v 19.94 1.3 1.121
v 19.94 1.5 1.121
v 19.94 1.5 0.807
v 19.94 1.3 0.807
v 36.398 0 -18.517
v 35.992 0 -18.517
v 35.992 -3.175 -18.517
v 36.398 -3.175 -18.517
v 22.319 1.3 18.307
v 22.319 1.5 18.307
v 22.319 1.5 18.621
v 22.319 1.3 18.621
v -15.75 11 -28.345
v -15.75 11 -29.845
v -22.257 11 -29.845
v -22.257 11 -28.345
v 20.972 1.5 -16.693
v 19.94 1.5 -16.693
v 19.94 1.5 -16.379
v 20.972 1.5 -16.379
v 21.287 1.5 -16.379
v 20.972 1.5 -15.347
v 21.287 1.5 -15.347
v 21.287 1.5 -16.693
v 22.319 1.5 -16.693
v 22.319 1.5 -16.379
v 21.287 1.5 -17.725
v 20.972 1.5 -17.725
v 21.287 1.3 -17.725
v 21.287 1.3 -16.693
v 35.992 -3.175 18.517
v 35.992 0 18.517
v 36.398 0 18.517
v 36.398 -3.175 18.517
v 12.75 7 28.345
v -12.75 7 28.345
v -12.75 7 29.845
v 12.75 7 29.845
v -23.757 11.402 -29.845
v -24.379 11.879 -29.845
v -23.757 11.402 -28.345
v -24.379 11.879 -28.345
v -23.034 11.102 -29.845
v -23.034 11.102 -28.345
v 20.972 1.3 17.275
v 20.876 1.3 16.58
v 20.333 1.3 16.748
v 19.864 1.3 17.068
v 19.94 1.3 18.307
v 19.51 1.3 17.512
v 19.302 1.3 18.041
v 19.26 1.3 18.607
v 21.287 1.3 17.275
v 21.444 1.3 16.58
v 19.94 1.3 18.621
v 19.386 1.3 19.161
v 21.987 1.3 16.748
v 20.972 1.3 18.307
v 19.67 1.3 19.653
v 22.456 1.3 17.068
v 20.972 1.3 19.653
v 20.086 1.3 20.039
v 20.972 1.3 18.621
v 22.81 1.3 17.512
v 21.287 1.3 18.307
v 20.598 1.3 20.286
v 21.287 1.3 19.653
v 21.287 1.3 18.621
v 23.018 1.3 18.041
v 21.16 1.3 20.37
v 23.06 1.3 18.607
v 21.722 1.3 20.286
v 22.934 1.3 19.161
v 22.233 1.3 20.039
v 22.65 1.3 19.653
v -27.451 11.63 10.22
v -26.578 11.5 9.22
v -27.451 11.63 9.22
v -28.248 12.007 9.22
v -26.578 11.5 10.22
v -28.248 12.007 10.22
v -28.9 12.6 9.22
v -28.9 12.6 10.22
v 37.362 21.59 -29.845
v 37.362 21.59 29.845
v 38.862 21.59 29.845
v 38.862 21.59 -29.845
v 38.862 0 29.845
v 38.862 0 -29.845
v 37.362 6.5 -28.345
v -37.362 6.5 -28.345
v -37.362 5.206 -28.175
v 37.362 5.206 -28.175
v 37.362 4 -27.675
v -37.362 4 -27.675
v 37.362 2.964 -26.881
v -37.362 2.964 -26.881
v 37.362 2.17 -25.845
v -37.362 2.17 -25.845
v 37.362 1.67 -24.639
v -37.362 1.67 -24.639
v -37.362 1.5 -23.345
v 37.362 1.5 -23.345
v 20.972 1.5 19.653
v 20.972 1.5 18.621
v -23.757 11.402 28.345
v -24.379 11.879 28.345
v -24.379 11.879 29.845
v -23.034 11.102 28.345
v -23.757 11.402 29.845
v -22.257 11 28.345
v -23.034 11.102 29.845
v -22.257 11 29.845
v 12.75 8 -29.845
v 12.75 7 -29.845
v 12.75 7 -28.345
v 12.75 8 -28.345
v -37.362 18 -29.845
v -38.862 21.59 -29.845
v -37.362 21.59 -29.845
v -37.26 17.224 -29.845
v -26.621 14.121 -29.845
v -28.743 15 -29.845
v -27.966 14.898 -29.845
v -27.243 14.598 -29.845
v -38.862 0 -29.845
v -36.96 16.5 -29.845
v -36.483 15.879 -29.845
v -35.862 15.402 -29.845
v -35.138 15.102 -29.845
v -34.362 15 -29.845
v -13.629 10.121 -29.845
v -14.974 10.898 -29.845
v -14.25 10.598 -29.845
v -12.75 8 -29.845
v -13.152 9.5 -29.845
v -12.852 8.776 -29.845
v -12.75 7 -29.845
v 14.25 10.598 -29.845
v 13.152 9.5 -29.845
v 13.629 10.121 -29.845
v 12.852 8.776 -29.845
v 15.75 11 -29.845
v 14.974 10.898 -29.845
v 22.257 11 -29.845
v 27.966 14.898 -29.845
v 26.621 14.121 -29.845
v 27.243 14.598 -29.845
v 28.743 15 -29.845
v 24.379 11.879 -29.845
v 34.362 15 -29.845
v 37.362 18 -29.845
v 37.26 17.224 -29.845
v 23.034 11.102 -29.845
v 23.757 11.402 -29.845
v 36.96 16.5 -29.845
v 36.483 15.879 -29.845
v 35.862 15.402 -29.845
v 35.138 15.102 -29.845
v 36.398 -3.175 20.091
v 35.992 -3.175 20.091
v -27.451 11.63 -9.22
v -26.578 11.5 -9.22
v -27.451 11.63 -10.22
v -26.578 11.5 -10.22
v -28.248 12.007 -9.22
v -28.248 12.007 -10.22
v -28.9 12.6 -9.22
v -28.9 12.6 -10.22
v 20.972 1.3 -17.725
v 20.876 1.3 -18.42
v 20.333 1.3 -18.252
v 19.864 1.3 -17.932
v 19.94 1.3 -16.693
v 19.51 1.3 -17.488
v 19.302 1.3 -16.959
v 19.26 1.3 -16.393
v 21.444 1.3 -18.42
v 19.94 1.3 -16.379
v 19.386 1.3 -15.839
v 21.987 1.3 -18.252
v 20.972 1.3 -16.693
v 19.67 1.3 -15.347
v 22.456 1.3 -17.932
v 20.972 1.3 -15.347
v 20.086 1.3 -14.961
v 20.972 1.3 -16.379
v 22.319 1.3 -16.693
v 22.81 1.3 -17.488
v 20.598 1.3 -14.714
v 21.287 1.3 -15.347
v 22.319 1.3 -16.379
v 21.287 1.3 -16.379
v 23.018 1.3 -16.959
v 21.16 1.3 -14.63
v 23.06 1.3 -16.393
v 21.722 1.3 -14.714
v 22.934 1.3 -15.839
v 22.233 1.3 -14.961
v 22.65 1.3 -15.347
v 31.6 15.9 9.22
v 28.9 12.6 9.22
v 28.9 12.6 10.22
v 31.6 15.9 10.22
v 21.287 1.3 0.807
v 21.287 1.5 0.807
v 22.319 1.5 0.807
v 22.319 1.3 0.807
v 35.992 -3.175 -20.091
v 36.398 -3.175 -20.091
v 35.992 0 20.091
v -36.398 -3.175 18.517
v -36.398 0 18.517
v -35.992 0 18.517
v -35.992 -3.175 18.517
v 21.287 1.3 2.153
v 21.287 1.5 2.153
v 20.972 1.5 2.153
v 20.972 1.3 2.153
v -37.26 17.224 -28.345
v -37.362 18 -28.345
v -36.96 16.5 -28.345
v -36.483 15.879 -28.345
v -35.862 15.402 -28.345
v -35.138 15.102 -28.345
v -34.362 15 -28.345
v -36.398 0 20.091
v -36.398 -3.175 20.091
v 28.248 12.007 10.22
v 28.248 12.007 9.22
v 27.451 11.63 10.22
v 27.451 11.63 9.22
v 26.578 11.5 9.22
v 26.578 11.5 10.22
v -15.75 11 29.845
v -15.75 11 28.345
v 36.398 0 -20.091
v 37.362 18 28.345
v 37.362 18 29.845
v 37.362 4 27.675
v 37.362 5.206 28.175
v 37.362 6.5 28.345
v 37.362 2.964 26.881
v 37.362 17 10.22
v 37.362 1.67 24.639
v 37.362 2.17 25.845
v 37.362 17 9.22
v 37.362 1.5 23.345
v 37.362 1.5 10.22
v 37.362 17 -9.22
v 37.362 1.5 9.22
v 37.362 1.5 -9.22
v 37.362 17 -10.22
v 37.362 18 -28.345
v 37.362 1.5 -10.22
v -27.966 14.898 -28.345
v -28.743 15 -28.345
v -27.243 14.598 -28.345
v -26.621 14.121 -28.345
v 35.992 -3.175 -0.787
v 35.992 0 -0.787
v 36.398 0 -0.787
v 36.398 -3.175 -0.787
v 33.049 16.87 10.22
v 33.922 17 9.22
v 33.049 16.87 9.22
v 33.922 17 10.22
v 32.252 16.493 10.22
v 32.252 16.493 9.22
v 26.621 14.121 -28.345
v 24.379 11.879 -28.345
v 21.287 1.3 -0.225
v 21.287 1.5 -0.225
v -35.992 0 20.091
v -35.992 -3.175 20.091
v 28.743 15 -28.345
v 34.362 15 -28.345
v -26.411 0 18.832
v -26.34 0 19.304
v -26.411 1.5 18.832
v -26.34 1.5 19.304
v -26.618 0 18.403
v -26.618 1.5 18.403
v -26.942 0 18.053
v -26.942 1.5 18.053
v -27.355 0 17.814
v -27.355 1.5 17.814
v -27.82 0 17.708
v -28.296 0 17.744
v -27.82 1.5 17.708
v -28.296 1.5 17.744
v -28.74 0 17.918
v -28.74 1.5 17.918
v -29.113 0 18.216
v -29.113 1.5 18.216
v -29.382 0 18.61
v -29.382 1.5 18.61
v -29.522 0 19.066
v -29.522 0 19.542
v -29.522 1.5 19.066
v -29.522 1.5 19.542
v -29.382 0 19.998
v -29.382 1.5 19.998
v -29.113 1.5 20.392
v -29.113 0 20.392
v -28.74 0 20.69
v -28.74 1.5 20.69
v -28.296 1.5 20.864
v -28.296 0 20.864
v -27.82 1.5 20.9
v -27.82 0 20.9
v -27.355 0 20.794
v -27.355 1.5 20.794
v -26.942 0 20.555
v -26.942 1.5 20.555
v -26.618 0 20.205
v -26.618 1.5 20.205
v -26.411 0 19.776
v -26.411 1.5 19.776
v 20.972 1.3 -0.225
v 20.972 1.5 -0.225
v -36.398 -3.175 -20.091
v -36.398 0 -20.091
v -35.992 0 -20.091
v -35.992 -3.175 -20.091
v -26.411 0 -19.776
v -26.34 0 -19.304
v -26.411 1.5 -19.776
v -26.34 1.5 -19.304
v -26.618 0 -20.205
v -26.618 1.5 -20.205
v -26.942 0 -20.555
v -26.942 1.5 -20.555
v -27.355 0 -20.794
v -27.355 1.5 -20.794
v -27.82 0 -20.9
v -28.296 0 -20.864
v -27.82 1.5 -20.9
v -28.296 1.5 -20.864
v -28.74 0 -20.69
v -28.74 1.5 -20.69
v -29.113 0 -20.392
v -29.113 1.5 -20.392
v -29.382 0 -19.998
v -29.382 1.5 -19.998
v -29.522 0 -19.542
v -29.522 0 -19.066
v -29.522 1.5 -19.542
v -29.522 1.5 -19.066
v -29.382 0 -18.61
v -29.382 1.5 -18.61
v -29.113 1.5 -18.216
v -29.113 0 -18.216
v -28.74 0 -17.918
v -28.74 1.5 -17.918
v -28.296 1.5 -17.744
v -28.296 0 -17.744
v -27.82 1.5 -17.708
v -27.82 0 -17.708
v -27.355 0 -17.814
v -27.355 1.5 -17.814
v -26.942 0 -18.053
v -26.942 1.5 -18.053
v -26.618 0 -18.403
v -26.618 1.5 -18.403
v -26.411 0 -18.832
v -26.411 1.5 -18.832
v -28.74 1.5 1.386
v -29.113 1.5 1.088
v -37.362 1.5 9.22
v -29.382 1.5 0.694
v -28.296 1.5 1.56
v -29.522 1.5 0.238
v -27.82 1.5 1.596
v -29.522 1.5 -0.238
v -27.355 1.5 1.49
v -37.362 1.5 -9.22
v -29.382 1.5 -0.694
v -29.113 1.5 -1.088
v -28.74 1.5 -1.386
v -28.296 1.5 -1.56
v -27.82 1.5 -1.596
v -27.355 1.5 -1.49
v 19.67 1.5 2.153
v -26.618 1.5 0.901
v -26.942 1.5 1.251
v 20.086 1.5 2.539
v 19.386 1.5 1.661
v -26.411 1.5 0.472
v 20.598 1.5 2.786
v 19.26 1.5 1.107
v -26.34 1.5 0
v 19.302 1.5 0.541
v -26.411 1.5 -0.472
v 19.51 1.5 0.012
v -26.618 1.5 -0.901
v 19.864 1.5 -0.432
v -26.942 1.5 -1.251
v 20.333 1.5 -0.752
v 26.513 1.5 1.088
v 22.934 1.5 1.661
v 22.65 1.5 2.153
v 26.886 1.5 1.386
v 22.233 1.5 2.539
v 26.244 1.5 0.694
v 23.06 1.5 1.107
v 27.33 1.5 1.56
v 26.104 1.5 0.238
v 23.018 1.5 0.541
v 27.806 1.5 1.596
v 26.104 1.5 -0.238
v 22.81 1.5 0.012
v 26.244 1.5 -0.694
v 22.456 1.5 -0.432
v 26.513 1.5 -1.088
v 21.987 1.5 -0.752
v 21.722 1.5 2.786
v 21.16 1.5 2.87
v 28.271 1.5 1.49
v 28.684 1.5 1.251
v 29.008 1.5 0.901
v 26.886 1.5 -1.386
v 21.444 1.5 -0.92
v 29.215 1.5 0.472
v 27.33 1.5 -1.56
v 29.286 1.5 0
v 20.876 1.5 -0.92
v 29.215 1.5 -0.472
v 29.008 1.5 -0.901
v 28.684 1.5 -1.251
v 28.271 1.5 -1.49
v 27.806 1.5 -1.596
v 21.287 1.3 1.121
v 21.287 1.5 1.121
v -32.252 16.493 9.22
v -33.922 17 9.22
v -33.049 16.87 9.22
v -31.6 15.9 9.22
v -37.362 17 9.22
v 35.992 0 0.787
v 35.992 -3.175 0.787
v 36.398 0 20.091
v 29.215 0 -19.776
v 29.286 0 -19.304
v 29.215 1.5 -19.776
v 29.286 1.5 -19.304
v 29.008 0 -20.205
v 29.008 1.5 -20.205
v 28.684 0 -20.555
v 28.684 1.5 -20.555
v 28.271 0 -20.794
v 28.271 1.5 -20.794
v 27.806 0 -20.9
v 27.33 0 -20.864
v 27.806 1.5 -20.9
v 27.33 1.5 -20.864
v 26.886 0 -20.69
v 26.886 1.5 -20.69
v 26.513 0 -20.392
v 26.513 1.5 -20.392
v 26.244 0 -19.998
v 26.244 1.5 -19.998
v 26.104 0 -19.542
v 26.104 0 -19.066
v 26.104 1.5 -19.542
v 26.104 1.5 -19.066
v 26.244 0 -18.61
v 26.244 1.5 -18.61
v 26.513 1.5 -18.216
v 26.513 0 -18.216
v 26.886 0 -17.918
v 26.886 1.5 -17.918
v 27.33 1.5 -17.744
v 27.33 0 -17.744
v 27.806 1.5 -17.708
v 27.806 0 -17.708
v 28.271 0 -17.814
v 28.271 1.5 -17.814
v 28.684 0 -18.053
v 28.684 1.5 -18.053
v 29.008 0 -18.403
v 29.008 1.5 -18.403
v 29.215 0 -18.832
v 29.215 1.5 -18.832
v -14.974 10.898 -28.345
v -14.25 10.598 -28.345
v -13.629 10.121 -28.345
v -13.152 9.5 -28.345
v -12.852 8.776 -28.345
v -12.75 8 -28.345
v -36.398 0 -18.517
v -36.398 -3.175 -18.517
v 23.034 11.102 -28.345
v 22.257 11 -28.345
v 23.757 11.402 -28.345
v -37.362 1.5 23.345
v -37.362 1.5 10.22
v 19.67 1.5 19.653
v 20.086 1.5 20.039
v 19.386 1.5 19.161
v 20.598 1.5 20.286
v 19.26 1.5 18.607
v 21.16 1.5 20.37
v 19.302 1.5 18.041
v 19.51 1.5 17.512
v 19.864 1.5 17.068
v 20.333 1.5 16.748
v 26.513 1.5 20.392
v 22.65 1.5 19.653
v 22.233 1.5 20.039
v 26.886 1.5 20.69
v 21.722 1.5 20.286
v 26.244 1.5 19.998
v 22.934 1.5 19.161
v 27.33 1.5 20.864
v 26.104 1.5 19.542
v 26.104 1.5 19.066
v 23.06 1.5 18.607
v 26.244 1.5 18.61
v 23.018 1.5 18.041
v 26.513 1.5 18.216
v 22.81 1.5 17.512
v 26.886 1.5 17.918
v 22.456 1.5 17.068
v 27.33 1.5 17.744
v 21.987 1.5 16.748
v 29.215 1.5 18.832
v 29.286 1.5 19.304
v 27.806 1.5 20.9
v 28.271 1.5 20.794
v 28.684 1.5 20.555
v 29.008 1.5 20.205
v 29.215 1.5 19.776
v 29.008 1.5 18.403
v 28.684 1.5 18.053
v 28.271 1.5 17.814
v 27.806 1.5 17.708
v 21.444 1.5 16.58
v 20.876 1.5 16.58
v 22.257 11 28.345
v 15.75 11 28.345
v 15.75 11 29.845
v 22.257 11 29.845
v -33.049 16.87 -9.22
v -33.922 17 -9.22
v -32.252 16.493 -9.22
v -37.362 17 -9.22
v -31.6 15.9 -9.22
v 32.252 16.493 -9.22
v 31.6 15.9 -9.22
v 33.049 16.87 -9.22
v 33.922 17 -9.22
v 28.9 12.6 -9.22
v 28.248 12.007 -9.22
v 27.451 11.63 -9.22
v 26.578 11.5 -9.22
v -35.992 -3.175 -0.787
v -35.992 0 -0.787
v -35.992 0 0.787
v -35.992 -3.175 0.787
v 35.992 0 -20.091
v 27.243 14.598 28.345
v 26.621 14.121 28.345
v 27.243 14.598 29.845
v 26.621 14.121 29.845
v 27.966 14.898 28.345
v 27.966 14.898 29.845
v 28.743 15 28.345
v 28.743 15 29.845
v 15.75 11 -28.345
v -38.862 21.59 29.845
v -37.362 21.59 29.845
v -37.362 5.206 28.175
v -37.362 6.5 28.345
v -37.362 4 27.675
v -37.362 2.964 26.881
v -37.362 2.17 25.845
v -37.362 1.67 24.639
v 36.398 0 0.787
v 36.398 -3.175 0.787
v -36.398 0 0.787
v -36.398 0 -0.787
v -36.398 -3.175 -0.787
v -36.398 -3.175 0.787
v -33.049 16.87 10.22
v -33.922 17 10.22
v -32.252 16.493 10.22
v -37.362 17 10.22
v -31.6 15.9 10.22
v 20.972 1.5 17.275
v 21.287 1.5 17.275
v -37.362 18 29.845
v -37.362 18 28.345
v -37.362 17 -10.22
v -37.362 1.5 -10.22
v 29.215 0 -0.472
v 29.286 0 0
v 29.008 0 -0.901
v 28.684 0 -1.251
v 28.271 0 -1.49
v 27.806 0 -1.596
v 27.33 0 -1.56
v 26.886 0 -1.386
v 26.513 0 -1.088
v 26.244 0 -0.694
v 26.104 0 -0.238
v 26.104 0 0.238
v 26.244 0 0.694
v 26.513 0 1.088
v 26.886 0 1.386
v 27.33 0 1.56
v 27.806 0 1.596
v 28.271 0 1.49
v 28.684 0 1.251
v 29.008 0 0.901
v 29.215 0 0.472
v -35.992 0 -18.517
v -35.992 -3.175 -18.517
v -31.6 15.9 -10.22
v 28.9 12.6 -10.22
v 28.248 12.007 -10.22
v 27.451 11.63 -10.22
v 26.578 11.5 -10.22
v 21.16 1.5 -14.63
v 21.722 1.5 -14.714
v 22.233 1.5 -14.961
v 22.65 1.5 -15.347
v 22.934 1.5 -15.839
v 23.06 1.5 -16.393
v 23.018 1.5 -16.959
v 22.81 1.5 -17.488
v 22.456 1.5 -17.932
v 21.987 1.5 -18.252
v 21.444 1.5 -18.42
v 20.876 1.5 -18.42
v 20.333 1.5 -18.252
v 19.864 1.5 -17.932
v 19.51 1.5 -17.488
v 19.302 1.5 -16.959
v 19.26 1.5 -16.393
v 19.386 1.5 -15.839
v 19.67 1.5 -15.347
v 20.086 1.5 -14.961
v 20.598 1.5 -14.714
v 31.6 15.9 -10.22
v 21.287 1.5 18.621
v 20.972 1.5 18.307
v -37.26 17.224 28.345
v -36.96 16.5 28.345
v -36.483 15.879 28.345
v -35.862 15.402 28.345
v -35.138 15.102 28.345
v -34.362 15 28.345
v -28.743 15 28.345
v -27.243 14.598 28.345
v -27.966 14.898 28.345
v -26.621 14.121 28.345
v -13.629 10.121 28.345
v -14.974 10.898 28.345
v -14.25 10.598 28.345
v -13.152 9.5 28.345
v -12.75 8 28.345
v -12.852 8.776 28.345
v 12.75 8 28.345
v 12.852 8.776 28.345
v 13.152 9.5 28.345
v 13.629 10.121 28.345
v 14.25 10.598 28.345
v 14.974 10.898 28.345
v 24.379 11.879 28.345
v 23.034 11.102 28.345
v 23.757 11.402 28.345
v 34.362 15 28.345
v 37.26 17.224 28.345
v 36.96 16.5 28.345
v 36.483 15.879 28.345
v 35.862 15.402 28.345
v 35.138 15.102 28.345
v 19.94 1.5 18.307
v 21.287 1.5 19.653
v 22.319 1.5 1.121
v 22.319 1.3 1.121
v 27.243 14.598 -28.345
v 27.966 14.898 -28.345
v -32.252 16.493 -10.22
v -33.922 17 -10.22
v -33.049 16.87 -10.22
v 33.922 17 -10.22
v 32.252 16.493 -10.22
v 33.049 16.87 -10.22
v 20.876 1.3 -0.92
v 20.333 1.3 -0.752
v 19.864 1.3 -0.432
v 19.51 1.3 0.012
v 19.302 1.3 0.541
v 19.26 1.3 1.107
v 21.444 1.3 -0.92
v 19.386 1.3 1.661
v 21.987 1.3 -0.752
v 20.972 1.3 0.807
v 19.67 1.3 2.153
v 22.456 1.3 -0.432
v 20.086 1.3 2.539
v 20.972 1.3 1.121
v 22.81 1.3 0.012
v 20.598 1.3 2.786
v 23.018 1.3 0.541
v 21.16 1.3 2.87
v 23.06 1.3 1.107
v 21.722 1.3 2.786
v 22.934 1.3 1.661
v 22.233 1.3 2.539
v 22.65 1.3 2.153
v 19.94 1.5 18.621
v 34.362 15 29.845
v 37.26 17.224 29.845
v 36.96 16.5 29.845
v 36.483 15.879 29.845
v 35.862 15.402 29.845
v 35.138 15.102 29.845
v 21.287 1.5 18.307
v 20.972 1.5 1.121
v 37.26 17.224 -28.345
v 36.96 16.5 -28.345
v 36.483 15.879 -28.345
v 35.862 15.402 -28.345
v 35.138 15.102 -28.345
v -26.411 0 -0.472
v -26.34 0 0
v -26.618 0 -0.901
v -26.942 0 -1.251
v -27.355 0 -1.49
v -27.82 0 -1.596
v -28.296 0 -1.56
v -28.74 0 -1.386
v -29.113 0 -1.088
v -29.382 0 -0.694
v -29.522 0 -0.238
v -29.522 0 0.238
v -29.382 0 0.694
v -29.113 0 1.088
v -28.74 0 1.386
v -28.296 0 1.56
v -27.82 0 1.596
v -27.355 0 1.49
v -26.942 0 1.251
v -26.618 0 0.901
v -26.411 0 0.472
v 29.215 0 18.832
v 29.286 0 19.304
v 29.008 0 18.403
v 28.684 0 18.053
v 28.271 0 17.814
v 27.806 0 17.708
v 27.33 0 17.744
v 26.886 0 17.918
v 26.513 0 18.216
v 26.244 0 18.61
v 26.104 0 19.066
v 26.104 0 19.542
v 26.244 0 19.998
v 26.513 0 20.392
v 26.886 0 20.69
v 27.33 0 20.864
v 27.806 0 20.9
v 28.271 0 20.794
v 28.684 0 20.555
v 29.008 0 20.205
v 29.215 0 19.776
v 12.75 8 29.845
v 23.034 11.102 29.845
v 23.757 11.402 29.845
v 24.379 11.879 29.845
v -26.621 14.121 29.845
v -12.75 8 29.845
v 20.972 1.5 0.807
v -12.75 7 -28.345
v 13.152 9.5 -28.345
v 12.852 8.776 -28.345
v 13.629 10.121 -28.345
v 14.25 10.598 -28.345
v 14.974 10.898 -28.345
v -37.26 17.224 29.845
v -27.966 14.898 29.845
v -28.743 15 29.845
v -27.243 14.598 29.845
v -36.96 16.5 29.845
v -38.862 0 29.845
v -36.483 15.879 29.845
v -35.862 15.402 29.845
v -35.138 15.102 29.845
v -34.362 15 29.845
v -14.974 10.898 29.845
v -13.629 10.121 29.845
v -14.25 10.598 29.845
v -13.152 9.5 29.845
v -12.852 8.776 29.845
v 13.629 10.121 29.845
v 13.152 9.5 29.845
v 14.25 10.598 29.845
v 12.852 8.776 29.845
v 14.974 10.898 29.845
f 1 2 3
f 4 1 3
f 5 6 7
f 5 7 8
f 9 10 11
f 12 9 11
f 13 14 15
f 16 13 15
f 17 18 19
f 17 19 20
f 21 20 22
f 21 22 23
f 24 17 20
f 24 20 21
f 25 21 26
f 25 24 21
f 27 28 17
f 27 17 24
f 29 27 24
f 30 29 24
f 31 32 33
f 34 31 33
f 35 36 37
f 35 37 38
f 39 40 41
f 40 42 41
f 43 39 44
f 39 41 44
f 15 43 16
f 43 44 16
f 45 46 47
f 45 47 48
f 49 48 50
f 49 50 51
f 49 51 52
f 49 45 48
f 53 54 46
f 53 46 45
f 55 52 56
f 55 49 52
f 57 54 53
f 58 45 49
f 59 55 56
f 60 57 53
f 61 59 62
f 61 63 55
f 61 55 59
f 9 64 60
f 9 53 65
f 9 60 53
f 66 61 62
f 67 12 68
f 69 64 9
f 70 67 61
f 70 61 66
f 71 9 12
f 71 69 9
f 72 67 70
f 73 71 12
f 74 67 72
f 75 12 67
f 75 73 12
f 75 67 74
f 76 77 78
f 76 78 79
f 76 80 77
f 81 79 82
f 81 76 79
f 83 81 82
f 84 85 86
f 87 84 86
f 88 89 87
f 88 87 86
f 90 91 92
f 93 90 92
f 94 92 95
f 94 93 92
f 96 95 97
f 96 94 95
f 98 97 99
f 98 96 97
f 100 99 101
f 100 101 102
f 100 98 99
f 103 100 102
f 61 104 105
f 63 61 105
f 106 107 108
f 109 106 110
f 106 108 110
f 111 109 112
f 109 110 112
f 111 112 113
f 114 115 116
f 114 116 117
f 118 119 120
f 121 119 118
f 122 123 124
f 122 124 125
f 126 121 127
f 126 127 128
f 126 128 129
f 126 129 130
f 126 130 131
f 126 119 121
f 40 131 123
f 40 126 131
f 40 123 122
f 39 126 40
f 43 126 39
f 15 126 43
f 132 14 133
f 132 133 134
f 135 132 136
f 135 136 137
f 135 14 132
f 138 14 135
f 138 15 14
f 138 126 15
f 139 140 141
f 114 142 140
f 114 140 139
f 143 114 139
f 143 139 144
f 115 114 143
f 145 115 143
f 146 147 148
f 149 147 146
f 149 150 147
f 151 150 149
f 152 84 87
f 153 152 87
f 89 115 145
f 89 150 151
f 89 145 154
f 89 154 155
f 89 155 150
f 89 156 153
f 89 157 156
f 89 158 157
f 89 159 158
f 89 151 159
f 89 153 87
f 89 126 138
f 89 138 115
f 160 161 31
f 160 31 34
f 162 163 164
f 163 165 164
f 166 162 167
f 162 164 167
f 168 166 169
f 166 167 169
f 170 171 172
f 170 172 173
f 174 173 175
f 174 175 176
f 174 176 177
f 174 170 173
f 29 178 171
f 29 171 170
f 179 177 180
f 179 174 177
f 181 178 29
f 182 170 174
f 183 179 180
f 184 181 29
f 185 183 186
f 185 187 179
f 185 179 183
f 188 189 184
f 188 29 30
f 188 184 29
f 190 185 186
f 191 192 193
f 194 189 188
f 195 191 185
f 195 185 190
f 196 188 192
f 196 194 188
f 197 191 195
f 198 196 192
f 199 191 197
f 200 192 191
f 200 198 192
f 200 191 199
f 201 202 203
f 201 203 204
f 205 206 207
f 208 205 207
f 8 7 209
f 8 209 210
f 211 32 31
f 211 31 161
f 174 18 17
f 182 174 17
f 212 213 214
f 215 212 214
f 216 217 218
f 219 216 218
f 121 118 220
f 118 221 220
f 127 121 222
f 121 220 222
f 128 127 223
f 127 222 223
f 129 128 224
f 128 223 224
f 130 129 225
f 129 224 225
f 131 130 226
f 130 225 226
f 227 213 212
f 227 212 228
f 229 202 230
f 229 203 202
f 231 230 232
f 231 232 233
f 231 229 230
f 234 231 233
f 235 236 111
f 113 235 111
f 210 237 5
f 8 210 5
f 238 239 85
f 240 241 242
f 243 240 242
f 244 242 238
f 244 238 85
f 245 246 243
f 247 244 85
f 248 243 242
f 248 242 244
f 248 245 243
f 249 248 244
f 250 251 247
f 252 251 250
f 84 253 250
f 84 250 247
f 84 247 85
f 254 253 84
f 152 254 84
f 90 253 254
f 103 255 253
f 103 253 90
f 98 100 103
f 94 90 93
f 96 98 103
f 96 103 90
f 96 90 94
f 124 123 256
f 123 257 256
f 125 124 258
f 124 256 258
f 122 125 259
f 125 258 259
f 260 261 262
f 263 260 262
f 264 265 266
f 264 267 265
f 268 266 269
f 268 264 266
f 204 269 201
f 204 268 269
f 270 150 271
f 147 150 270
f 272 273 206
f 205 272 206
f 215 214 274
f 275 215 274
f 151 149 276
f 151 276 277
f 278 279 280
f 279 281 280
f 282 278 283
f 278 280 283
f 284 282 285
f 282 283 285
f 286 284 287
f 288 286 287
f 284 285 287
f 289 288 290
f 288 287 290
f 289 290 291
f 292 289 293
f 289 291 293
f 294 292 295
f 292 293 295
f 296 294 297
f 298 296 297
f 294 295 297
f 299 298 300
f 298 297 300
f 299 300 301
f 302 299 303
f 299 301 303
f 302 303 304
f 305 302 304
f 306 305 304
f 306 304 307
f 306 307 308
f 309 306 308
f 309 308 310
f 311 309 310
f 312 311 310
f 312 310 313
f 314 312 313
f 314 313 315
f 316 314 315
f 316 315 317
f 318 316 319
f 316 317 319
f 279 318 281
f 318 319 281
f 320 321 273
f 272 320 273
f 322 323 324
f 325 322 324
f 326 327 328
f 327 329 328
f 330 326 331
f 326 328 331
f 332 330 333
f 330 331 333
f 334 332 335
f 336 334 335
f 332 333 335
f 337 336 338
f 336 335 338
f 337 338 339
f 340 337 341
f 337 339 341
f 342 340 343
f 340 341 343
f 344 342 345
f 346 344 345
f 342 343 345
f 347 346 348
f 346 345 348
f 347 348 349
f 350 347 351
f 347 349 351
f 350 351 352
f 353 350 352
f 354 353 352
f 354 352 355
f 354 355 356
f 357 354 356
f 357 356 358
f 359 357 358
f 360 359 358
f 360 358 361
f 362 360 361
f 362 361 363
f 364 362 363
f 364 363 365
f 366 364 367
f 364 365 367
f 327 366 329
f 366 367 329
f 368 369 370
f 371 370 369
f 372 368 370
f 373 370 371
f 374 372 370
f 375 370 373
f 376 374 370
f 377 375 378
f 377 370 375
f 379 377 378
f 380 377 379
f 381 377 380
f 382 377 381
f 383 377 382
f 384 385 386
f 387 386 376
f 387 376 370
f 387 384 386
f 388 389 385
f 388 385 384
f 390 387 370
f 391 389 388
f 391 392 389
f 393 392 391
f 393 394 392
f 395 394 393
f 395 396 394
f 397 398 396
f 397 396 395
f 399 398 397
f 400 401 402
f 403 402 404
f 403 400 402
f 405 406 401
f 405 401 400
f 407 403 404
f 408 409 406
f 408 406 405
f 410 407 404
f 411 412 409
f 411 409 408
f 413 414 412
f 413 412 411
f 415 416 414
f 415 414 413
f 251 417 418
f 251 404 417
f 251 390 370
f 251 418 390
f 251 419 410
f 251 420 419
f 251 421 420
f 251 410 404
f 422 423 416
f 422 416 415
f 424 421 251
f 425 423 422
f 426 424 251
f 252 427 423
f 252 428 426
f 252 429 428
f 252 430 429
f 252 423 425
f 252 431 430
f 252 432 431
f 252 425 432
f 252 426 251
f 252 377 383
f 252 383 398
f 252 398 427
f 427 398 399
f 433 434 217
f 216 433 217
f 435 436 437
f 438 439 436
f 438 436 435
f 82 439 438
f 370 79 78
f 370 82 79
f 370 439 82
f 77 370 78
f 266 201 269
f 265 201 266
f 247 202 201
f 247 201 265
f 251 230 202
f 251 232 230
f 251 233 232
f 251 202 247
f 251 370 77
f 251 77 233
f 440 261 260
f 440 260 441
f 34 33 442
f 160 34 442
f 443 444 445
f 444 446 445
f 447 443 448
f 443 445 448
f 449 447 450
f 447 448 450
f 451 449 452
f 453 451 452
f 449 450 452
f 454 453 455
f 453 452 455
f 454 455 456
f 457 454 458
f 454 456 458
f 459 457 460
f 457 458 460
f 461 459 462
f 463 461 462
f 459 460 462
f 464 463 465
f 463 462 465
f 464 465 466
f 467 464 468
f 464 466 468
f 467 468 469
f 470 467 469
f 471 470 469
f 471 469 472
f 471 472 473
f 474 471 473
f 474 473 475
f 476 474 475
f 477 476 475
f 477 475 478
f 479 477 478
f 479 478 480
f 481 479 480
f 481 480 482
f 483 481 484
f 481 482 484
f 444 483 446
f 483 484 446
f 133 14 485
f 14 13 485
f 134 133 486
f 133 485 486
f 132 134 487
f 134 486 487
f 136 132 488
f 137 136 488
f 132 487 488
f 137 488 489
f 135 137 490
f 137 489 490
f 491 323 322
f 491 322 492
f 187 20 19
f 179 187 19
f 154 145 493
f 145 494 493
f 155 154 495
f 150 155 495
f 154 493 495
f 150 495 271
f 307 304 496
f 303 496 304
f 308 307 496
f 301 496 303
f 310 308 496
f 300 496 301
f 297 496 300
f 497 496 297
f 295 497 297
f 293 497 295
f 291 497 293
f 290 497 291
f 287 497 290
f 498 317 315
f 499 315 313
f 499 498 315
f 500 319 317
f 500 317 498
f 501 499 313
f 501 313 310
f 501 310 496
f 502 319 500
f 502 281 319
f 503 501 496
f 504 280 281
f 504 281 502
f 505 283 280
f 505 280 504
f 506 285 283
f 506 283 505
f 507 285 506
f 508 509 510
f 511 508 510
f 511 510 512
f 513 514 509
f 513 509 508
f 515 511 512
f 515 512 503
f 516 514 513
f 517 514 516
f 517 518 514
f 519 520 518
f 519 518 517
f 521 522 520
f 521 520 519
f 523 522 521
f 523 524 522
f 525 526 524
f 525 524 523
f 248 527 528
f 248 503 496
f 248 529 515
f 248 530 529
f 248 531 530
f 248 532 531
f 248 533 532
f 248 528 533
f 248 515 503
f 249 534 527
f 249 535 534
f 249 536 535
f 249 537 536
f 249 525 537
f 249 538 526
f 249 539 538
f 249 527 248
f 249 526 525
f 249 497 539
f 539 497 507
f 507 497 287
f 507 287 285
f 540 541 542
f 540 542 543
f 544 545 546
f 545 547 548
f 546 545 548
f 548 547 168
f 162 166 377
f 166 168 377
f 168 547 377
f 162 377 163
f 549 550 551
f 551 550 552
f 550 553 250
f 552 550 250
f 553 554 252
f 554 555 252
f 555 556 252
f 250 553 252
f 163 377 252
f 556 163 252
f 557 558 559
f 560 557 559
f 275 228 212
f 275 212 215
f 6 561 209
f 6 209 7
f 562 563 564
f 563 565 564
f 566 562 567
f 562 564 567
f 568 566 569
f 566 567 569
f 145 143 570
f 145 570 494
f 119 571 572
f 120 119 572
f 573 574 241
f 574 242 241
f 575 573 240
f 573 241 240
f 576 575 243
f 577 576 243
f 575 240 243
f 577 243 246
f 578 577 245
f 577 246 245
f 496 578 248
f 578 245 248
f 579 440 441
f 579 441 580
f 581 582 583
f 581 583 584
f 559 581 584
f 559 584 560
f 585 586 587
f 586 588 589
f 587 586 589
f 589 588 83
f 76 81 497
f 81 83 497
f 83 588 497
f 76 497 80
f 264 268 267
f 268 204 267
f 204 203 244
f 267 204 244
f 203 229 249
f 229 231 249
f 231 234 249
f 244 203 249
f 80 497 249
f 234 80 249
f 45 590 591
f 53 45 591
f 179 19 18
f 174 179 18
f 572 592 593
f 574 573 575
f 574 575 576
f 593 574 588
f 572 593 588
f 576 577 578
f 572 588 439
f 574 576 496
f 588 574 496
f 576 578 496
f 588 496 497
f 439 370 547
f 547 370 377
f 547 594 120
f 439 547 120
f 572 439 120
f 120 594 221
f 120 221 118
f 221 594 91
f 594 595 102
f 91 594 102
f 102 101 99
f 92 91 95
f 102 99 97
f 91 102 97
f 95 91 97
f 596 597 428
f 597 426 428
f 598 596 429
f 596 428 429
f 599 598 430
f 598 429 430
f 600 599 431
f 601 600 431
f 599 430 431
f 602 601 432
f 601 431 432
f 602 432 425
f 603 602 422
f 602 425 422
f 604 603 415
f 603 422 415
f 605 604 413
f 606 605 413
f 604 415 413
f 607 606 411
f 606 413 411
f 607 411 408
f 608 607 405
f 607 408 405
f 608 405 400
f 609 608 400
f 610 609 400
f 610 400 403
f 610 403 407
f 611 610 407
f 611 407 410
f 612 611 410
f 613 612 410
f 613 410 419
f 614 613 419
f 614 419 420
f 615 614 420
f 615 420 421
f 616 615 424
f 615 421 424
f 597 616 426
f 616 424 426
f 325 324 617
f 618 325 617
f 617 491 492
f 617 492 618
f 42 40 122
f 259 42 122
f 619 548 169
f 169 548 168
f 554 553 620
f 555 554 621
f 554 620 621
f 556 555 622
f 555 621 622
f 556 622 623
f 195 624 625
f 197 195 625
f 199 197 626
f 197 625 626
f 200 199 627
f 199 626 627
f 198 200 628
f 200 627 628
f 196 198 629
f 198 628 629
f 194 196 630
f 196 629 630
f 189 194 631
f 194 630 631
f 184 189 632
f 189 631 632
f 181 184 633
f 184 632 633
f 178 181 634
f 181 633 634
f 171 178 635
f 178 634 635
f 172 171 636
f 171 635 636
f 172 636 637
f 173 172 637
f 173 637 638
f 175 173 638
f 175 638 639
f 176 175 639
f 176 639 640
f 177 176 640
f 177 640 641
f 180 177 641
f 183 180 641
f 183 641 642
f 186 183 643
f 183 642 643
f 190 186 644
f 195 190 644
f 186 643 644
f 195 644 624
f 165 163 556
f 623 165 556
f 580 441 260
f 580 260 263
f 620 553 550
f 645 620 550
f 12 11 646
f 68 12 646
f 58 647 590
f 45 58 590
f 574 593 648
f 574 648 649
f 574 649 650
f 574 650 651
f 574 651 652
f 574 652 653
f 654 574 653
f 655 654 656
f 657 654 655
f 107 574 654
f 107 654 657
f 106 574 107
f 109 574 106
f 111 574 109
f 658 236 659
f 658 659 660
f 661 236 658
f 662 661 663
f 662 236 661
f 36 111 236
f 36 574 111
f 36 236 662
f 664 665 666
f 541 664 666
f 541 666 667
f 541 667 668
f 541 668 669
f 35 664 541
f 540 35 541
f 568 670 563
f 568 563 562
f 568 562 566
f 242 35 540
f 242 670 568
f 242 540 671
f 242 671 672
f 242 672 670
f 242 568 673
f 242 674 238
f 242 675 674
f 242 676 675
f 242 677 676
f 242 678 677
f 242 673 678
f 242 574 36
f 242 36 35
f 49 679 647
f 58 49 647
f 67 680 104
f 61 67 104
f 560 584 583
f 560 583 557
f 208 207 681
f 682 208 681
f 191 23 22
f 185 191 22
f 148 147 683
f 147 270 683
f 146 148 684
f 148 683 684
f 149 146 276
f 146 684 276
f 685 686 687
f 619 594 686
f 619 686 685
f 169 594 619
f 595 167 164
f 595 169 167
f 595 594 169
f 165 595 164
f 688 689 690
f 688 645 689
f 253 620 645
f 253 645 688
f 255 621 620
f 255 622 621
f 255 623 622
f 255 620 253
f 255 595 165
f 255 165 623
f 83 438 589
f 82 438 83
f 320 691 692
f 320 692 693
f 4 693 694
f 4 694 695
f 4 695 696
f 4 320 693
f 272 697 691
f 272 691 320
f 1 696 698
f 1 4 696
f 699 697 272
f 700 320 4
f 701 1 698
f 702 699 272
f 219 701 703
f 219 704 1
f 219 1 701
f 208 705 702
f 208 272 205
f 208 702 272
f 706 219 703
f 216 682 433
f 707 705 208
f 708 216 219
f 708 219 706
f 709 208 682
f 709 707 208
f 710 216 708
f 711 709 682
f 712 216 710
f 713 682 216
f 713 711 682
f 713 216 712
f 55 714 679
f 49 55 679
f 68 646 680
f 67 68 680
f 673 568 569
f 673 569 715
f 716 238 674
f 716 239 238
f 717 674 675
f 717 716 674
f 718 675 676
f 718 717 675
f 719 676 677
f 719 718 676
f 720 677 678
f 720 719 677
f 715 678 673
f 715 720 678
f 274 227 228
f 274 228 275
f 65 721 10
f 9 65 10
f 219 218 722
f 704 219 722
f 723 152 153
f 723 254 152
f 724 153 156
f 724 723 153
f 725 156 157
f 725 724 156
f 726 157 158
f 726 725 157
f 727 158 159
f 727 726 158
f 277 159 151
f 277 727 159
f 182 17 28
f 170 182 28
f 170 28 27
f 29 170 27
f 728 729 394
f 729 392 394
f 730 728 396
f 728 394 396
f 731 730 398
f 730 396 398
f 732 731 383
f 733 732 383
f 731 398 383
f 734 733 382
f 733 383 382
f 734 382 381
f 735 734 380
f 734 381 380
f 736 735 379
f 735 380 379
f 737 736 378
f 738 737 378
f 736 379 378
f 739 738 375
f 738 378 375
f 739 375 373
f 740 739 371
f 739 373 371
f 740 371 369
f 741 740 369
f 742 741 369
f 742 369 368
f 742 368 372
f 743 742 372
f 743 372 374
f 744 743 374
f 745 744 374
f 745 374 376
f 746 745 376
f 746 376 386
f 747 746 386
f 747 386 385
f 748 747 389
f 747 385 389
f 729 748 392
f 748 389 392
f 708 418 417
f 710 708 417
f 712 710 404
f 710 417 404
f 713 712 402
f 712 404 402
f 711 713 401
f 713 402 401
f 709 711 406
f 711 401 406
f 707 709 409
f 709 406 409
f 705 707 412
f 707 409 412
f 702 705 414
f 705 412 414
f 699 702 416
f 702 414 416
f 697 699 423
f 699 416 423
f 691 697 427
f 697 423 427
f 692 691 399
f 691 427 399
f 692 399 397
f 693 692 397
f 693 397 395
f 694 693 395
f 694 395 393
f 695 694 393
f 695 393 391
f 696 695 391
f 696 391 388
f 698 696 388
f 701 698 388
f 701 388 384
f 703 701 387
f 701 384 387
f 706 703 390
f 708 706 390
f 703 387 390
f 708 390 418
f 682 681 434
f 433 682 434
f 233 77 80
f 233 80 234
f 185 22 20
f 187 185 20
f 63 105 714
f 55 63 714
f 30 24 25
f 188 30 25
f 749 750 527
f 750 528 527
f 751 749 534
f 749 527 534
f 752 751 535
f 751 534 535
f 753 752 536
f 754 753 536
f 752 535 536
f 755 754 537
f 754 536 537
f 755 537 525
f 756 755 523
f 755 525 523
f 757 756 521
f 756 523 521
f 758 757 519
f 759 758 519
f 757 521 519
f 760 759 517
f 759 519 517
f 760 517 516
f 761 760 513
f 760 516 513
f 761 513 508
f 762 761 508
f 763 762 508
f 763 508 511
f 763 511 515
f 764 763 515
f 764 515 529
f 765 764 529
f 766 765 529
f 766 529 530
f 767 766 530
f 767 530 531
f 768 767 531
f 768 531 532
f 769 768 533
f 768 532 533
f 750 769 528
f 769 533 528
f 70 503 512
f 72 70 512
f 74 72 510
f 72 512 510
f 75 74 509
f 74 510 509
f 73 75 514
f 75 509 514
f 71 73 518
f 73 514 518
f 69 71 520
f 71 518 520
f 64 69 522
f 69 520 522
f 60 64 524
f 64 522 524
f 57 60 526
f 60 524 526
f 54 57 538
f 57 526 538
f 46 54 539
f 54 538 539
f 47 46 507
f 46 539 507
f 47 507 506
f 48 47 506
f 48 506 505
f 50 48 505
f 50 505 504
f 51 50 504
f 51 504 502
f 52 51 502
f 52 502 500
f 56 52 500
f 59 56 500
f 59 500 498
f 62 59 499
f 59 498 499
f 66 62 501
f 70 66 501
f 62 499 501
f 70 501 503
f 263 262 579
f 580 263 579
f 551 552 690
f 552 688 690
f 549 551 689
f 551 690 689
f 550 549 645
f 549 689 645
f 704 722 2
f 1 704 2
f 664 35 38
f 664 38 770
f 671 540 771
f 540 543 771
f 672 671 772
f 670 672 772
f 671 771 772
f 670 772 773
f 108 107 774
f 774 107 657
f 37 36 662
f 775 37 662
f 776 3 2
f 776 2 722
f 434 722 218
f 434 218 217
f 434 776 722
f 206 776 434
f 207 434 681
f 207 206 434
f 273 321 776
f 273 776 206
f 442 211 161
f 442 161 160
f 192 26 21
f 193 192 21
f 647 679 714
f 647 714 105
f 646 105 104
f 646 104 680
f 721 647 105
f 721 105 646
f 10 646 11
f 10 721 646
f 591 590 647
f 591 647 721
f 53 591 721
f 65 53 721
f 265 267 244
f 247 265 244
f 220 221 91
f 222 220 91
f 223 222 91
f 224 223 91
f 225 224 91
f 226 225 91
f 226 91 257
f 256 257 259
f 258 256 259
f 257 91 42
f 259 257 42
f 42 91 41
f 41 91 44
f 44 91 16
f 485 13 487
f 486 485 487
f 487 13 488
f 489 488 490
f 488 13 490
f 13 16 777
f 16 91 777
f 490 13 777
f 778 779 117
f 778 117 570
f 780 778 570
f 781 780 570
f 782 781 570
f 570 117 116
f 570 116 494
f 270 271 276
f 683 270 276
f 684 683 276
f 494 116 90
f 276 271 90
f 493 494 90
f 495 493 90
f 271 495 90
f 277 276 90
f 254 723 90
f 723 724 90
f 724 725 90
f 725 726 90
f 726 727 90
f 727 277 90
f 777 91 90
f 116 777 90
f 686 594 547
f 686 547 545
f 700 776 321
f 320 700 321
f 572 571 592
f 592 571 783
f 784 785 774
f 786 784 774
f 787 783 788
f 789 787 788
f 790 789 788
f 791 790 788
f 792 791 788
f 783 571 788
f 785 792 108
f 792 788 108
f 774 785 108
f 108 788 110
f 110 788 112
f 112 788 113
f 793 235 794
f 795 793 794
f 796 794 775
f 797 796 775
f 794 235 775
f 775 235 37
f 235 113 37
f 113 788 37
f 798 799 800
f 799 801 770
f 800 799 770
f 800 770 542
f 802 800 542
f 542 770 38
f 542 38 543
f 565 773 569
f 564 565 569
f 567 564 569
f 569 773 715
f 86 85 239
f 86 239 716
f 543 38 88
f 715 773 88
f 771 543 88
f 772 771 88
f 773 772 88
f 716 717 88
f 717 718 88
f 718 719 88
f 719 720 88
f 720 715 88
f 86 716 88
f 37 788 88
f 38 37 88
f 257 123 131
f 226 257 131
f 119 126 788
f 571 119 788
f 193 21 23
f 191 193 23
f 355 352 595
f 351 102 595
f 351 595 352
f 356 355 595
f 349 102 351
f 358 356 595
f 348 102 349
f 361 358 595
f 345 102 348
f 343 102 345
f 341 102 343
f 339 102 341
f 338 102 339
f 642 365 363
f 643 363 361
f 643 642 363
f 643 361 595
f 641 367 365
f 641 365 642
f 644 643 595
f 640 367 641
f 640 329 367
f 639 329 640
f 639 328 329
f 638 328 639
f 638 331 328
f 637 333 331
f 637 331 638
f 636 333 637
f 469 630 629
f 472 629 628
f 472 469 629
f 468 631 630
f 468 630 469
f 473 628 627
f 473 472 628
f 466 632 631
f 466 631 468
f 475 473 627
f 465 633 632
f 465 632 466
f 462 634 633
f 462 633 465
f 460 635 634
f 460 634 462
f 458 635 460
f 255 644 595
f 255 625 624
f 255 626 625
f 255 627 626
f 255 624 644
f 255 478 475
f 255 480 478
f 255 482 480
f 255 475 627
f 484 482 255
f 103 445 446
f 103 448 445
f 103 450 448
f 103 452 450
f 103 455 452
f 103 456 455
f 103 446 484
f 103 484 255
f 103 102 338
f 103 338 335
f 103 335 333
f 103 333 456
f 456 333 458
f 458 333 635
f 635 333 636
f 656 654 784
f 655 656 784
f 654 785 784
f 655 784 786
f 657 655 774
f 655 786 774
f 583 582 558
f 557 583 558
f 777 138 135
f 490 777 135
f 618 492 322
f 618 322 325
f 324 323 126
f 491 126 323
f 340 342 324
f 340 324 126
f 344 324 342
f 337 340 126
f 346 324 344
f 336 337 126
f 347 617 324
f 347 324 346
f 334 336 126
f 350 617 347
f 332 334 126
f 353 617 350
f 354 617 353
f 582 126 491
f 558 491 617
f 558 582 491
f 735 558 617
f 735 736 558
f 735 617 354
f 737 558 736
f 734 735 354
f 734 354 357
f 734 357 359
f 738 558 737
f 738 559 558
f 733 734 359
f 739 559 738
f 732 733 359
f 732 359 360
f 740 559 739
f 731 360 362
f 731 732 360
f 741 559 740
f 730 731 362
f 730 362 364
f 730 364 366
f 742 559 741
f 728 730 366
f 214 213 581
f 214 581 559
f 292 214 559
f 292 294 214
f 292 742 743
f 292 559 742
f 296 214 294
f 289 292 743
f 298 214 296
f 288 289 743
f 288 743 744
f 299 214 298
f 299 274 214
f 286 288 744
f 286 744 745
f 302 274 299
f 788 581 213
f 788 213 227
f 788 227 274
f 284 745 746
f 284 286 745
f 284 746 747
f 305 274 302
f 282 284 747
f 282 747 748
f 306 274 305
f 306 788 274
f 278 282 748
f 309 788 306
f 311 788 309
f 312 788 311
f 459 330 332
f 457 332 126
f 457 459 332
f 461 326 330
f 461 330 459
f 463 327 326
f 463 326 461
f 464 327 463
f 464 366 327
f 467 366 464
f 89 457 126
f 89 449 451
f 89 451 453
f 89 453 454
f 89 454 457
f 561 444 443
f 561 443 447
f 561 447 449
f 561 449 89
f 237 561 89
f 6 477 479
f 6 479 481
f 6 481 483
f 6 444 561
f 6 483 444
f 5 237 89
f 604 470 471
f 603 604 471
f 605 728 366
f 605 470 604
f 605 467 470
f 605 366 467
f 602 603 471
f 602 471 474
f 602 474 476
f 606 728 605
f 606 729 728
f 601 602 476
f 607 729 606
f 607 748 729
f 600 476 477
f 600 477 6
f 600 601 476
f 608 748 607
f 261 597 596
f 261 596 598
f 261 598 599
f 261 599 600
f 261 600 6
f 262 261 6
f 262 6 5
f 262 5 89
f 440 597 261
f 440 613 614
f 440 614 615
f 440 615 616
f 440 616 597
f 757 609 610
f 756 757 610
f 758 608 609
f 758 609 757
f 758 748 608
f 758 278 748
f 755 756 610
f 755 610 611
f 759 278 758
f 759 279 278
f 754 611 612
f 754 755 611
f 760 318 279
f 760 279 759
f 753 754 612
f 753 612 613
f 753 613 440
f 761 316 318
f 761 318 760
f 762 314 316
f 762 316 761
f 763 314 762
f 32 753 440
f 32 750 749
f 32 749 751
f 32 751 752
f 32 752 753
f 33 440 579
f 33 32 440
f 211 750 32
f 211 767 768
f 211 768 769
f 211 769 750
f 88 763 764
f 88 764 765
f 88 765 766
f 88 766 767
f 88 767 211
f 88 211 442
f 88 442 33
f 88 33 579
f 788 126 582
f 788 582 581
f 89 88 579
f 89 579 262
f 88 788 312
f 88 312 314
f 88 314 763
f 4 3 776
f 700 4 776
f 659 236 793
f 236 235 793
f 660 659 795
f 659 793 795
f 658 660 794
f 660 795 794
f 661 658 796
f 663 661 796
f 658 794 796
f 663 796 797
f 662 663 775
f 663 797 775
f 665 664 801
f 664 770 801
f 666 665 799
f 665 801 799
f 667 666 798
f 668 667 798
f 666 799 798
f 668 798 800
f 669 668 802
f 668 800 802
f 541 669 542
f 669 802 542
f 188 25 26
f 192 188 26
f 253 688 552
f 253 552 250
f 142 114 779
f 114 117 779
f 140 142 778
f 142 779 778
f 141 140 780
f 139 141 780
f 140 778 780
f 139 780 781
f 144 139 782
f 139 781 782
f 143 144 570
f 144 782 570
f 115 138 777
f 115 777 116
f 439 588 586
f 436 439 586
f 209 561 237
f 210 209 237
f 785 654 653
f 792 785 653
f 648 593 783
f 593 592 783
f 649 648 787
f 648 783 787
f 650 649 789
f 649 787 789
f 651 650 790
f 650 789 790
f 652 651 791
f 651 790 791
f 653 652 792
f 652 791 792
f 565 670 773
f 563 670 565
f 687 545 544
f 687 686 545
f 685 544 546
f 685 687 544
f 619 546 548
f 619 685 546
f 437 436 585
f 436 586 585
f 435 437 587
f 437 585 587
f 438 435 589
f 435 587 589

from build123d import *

# Parameters (mm, degrees)
SKETCH1_W                 = 77.724
SKETCH1_H                 = 59.69
BOSS_EXTRUDE1_DEPTH       = 21.59
SKETCH2_W                 = 0.4064
SKETCH2_H                 = 1.5748
BOSS_EXTRUDE2_DEPTH       = 3.175
SKETCH3_W                 = 0.4064
SKETCH3_H                 = 1.5748
BOSS_EXTRUDE3_DEPTH       = 3.175
SKETCH4_W                 = 0.4064
SKETCH4_H                 = 1.5748
BOSS_EXTRUDE4_DEPTH       = 3.175
SKETCH5_W                 = 0.4064
SKETCH5_H                 = 1.5748
BOSS_EXTRUDE5_DEPTH       = 3.175
SKETCH6_W                 = 0.4064
SKETCH6_H                 = 1.5748
BOSS_EXTRUDE6_DEPTH       = 3.175
SKETCH7_W                 = 0.4064
SKETCH7_H                 = 1.5748
BOSS_EXTRUDE7_DEPTH       = 3.175
F_4_CLEARANCE_HOLE1_D     = 3.2004
F_4_CLEARANCE_HOLE1_DEPTH = 5.08
SHELL1_START              = 1.5
SHELL1_OUTLINE_W          = 74.724
SHELL1_OUTLINE_H          = 56.69
SHELL1_OUTLINE_R          = 3.1002
SHELL1_DEPTH              = 20.09
SHELL1_START_2            = 6.58
SHELL1_2_OUTLINE_R        = 3.1002
SHELL1_2_DEPTH            = 15.01
FILLET1_R                 = 5
CUT_EXTRUDE3_DEPTH        = 75.426334345
SKETCH11_W                = 74.724
SKETCH11_H                = 46.69
CUT_EXTRUDE4_DEPTH        = 53.958353156
SKETCH12_W                = 74.724
SKETCH12_H                = 1
BOSS_EXTRUDE8_DEPTH       = 15.5
CUT_EXTRUDE5_REACH        = 61.182
FILLET2_R                 = 3
SKETCH14_R                = 1.905686258
CUT_EXTRUDE6_DEPTH        = 0.2
LPATTERN1_COUNT           = 3
LPATTERN1_PITCH           = 17.5


# Read off the part's stored shape, not the designer's step: Shell1
with BuildPart() as part:
    # Sketch1 → Boss-Extrude1 (new body)
    with BuildSketch(Plane.XZ):
        Rectangle(SKETCH1_W, SKETCH1_H)
    extrude(amount=-BOSS_EXTRUDE1_DEPTH)

    # Sketch2 → Boss-Extrude2 (add)
    with BuildSketch(Plane.XZ):
        with Locations((-36.195, 0)):
            Rectangle(SKETCH2_W, SKETCH2_H)
    extrude(amount=BOSS_EXTRUDE2_DEPTH)

    # Sketch3 → Boss-Extrude3 (add)
    with BuildSketch(Plane.XZ):
        with Locations((36.195, 0)):
            Rectangle(SKETCH3_W, SKETCH3_H)
    extrude(amount=BOSS_EXTRUDE3_DEPTH)

    # Sketch4 → Boss-Extrude4 (add)
    with BuildSketch(Plane.XZ):
        with Locations((-36.195, 19.304)):
            Rectangle(SKETCH4_W, SKETCH4_H)
    extrude(amount=BOSS_EXTRUDE4_DEPTH)

    # Sketch5 → Boss-Extrude5 (add)
    with BuildSketch(Plane.XZ):
        with Locations((36.195, 19.304)):
            Rectangle(SKETCH5_W, SKETCH5_H)
    extrude(amount=BOSS_EXTRUDE5_DEPTH)

    # Sketch6 → Boss-Extrude6 (add)
    with BuildSketch(Plane.XZ):
        with Locations((36.195, -19.304)):
            Rectangle(SKETCH6_W, SKETCH6_H)
    extrude(amount=BOSS_EXTRUDE6_DEPTH)

    # Sketch7 → Boss-Extrude7 (add)
    with BuildSketch(Plane.XZ):
        with Locations((-36.195, -19.304)):
            Rectangle(SKETCH7_W, SKETCH7_H)
    extrude(amount=BOSS_EXTRUDE7_DEPTH)

    # #4 Clearance Hole1
    with Locations(Plane(origin=(0, 0, 0), x_dir=(-1, 0, 0), z_dir=(0, -1, 0))):
        with Locations((27.94, 19.304), (27.94, 0), (-27.686, 19.304), (-27.686, 0), (-27.686, -19.304), (27.94, -19.304)):
            Hole(F_4_CLEARANCE_HOLE1_D / 2, depth=F_4_CLEARANCE_HOLE1_DEPTH)

    # Shell1 outline → Shell1 (cut)
    with BuildSketch(Plane(origin=(0, 0, 0), x_dir=(1, 0, 0), z_dir=(0, 1, 0)).offset(SHELL1_START)):
        Rectangle(SHELL1_OUTLINE_W, SHELL1_OUTLINE_H)
        with Locations((-27.94, -19.304)):
            Circle(SHELL1_OUTLINE_R, mode=Mode.SUBTRACT)
        with Locations((-27.94, 0)):
            Circle(SHELL1_OUTLINE_R, mode=Mode.SUBTRACT)
        with Locations((27.686, -19.304)):
            Circle(SHELL1_OUTLINE_R, mode=Mode.SUBTRACT)
        with Locations((27.686, 0)):
            Circle(SHELL1_OUTLINE_R, mode=Mode.SUBTRACT)
        with Locations((-27.94, 19.304)):
            Circle(SHELL1_OUTLINE_R, mode=Mode.SUBTRACT)
        with Locations((27.686, 19.304)):
            Circle(SHELL1_OUTLINE_R, mode=Mode.SUBTRACT)
    extrude(amount=SHELL1_DEPTH, mode=Mode.SUBTRACT)

    # Shell1 2 outline → Shell1 2 (cut)
    with BuildSketch(Plane(origin=(0, 0, 0), x_dir=(1, 0, 0), z_dir=(0, 1, 0)).offset(SHELL1_START_2)):
        with Locations((-27.94, -19.304)):
            Circle(SHELL1_2_OUTLINE_R)
        with Locations((27.686, -19.304)):
            Circle(SHELL1_2_OUTLINE_R)
        with Locations((27.686, 0)):
            Circle(SHELL1_2_OUTLINE_R)
        with Locations((27.686, 19.304)):
            Circle(SHELL1_2_OUTLINE_R)
        with Locations((-27.94, 0)):
            Circle(SHELL1_2_OUTLINE_R)
        with Locations((-27.94, 19.304)):
            Circle(SHELL1_2_OUTLINE_R)
    extrude(amount=SHELL1_2_DEPTH, mode=Mode.SUBTRACT)

    # Fillet1
    fillet1_edges = [part.edges().sort_by_distance(p)[0] for p in [
        (0, 1.5, 28.345),
        (0, 1.5, -28.345),
    ]]
    fillet(fillet1_edges, radius=FILLET1_R)

    # Sketch10 → Cut-Extrude3 (cut, through all)
    with BuildSketch(Plane(origin=(0, 0, -29.845), x_dir=(-1, 0, 0), z_dir=(0, 0, -1))):
        Polygon((0, 7), (12.75, 7), (12.75, 11), (23.5, 11), (27.5, 15), (37.362, 15), (37.362, 21.59), (0, 21.59), align=None)
    cut_extrude3 = extrude(amount=-CUT_EXTRUDE3_DEPTH, mode=Mode.SUBTRACT)

    # Mirror1: Cut-Extrude3 across plane
    add(cut_extrude3.mirror(Plane(origin=(0, 0, 0), x_dir=(0, 0, 1), z_dir=(1, 0, 0))), mode=Mode.SUBTRACT)

    # Sketch11 → Cut-Extrude4 (cut, through all)
    with BuildSketch(Plane(origin=(0, 1.5, 0), x_dir=(1, 0, 0), z_dir=(0, 1, 0))):
        Rectangle(SKETCH11_W, SKETCH11_H)
    extrude(amount=CUT_EXTRUDE4_DEPTH, mode=Mode.SUBTRACT)

    # Sketch12 → Boss-Extrude8 (add)
    with BuildSketch(Plane(origin=(0, 1.5, 0), x_dir=(1, 0, 0), z_dir=(0, 1, 0))):
        with Locations((0, 9.72)):
            Rectangle(SKETCH12_W, SKETCH12_H)
    boss_extrude8 = extrude(amount=BOSS_EXTRUDE8_DEPTH)

    # Sketch13 → Cut-Extrude5 (cut, up to next)
    with BuildSketch(Plane.XY.offset(-9.22), mode=Mode.PRIVATE) as cut_extrude5_sk1:
        Polygon((-32.5, 17), (-28, 11.5), (28, 11.5), (32.5, 17), align=None)
    cut_extrude5_tool1 = extrude(cut_extrude5_sk1.sketch, amount=-CUT_EXTRUDE5_REACH, mode=Mode.PRIVATE) & part.part
    cut_extrude5 = cut_extrude5_tool1.solids().sort_by_distance((0, 14.318182, -9.22))[0]
    add(cut_extrude5, mode=Mode.SUBTRACT)

    # Mirror2: Boss-Extrude8, Cut-Extrude5 across plane
    add(boss_extrude8.mirror(Plane.XY))
    add(cut_extrude5.mirror(Plane.XY), mode=Mode.SUBTRACT)

    # Fillet2
    fillet2_edges = [part.edges().sort_by_distance(p)[0] for p in [
        (-27.5, 15, 29.095),
        (-27.5, 15, -29.095),
        (-23.5, 11, 29.095),
        (-23.5, 11, -29.095),
        (-12.75, 11, 29.095),
        (-12.75, 11, -29.095),
        (-37.362, 15, 29.095),
        (-37.362, 15, -29.095),
        (12.75, 11, 29.095),
        (12.75, 11, -29.095),
        (23.5, 11, 29.095),
        (23.5, 11, -29.095),
        (37.362, 15, 29.095),
        (37.362, 15, -29.095),
        (27.5, 15, 29.095),
        (27.5, 15, -29.095),
        (-32.5, 17, -9.72),
        (32.5, 17, -9.72),
        (28, 11.5, -9.72),
        (-28, 11.5, -9.72),
        (32.5, 17, 9.72),
        (-32.5, 17, 9.72),
        (-28, 11.5, 9.72),
        (28, 11.5, 9.72),
    ]]
    fillet(fillet2_edges, radius=FILLET2_R)

    # Sketch14 → Cut-Extrude6 (cut)
    with BuildSketch(Plane(origin=(0, 1.5, 0), x_dir=(1, 0, 0), z_dir=(0, 1, 0))):
        with Locations(Location((21.159931599, 16.535374869, 0), (0, 0, 270))):
            Circle(SKETCH14_R)
        Polygon((20.972468472, 16.692908218), (20.972468472, 17.7249595), (21.286571036, 17.7249595), (21.286571036, 16.692908218), (22.318622318, 16.692908218), (22.318622318, 16.378805654), (21.286571036, 16.378805654), (21.286571036, 15.346754372), (20.972468472, 15.346754372), (20.972468472, 16.378805654), (19.94041719, 16.378805654), (19.94041719, 16.692908218), align=None, mode=Mode.SUBTRACT)
    cut_extrude6 = extrude(amount=-CUT_EXTRUDE6_DEPTH, mode=Mode.SUBTRACT)

    # LPattern1: Cut-Extrude6 ×3
    with Locations(*[(0, 0, i * LPATTERN1_PITCH) for i in range(1, LPATTERN1_COUNT)]):
        add(cut_extrude6, mode=Mode.SUBTRACT)


solid = part.part
